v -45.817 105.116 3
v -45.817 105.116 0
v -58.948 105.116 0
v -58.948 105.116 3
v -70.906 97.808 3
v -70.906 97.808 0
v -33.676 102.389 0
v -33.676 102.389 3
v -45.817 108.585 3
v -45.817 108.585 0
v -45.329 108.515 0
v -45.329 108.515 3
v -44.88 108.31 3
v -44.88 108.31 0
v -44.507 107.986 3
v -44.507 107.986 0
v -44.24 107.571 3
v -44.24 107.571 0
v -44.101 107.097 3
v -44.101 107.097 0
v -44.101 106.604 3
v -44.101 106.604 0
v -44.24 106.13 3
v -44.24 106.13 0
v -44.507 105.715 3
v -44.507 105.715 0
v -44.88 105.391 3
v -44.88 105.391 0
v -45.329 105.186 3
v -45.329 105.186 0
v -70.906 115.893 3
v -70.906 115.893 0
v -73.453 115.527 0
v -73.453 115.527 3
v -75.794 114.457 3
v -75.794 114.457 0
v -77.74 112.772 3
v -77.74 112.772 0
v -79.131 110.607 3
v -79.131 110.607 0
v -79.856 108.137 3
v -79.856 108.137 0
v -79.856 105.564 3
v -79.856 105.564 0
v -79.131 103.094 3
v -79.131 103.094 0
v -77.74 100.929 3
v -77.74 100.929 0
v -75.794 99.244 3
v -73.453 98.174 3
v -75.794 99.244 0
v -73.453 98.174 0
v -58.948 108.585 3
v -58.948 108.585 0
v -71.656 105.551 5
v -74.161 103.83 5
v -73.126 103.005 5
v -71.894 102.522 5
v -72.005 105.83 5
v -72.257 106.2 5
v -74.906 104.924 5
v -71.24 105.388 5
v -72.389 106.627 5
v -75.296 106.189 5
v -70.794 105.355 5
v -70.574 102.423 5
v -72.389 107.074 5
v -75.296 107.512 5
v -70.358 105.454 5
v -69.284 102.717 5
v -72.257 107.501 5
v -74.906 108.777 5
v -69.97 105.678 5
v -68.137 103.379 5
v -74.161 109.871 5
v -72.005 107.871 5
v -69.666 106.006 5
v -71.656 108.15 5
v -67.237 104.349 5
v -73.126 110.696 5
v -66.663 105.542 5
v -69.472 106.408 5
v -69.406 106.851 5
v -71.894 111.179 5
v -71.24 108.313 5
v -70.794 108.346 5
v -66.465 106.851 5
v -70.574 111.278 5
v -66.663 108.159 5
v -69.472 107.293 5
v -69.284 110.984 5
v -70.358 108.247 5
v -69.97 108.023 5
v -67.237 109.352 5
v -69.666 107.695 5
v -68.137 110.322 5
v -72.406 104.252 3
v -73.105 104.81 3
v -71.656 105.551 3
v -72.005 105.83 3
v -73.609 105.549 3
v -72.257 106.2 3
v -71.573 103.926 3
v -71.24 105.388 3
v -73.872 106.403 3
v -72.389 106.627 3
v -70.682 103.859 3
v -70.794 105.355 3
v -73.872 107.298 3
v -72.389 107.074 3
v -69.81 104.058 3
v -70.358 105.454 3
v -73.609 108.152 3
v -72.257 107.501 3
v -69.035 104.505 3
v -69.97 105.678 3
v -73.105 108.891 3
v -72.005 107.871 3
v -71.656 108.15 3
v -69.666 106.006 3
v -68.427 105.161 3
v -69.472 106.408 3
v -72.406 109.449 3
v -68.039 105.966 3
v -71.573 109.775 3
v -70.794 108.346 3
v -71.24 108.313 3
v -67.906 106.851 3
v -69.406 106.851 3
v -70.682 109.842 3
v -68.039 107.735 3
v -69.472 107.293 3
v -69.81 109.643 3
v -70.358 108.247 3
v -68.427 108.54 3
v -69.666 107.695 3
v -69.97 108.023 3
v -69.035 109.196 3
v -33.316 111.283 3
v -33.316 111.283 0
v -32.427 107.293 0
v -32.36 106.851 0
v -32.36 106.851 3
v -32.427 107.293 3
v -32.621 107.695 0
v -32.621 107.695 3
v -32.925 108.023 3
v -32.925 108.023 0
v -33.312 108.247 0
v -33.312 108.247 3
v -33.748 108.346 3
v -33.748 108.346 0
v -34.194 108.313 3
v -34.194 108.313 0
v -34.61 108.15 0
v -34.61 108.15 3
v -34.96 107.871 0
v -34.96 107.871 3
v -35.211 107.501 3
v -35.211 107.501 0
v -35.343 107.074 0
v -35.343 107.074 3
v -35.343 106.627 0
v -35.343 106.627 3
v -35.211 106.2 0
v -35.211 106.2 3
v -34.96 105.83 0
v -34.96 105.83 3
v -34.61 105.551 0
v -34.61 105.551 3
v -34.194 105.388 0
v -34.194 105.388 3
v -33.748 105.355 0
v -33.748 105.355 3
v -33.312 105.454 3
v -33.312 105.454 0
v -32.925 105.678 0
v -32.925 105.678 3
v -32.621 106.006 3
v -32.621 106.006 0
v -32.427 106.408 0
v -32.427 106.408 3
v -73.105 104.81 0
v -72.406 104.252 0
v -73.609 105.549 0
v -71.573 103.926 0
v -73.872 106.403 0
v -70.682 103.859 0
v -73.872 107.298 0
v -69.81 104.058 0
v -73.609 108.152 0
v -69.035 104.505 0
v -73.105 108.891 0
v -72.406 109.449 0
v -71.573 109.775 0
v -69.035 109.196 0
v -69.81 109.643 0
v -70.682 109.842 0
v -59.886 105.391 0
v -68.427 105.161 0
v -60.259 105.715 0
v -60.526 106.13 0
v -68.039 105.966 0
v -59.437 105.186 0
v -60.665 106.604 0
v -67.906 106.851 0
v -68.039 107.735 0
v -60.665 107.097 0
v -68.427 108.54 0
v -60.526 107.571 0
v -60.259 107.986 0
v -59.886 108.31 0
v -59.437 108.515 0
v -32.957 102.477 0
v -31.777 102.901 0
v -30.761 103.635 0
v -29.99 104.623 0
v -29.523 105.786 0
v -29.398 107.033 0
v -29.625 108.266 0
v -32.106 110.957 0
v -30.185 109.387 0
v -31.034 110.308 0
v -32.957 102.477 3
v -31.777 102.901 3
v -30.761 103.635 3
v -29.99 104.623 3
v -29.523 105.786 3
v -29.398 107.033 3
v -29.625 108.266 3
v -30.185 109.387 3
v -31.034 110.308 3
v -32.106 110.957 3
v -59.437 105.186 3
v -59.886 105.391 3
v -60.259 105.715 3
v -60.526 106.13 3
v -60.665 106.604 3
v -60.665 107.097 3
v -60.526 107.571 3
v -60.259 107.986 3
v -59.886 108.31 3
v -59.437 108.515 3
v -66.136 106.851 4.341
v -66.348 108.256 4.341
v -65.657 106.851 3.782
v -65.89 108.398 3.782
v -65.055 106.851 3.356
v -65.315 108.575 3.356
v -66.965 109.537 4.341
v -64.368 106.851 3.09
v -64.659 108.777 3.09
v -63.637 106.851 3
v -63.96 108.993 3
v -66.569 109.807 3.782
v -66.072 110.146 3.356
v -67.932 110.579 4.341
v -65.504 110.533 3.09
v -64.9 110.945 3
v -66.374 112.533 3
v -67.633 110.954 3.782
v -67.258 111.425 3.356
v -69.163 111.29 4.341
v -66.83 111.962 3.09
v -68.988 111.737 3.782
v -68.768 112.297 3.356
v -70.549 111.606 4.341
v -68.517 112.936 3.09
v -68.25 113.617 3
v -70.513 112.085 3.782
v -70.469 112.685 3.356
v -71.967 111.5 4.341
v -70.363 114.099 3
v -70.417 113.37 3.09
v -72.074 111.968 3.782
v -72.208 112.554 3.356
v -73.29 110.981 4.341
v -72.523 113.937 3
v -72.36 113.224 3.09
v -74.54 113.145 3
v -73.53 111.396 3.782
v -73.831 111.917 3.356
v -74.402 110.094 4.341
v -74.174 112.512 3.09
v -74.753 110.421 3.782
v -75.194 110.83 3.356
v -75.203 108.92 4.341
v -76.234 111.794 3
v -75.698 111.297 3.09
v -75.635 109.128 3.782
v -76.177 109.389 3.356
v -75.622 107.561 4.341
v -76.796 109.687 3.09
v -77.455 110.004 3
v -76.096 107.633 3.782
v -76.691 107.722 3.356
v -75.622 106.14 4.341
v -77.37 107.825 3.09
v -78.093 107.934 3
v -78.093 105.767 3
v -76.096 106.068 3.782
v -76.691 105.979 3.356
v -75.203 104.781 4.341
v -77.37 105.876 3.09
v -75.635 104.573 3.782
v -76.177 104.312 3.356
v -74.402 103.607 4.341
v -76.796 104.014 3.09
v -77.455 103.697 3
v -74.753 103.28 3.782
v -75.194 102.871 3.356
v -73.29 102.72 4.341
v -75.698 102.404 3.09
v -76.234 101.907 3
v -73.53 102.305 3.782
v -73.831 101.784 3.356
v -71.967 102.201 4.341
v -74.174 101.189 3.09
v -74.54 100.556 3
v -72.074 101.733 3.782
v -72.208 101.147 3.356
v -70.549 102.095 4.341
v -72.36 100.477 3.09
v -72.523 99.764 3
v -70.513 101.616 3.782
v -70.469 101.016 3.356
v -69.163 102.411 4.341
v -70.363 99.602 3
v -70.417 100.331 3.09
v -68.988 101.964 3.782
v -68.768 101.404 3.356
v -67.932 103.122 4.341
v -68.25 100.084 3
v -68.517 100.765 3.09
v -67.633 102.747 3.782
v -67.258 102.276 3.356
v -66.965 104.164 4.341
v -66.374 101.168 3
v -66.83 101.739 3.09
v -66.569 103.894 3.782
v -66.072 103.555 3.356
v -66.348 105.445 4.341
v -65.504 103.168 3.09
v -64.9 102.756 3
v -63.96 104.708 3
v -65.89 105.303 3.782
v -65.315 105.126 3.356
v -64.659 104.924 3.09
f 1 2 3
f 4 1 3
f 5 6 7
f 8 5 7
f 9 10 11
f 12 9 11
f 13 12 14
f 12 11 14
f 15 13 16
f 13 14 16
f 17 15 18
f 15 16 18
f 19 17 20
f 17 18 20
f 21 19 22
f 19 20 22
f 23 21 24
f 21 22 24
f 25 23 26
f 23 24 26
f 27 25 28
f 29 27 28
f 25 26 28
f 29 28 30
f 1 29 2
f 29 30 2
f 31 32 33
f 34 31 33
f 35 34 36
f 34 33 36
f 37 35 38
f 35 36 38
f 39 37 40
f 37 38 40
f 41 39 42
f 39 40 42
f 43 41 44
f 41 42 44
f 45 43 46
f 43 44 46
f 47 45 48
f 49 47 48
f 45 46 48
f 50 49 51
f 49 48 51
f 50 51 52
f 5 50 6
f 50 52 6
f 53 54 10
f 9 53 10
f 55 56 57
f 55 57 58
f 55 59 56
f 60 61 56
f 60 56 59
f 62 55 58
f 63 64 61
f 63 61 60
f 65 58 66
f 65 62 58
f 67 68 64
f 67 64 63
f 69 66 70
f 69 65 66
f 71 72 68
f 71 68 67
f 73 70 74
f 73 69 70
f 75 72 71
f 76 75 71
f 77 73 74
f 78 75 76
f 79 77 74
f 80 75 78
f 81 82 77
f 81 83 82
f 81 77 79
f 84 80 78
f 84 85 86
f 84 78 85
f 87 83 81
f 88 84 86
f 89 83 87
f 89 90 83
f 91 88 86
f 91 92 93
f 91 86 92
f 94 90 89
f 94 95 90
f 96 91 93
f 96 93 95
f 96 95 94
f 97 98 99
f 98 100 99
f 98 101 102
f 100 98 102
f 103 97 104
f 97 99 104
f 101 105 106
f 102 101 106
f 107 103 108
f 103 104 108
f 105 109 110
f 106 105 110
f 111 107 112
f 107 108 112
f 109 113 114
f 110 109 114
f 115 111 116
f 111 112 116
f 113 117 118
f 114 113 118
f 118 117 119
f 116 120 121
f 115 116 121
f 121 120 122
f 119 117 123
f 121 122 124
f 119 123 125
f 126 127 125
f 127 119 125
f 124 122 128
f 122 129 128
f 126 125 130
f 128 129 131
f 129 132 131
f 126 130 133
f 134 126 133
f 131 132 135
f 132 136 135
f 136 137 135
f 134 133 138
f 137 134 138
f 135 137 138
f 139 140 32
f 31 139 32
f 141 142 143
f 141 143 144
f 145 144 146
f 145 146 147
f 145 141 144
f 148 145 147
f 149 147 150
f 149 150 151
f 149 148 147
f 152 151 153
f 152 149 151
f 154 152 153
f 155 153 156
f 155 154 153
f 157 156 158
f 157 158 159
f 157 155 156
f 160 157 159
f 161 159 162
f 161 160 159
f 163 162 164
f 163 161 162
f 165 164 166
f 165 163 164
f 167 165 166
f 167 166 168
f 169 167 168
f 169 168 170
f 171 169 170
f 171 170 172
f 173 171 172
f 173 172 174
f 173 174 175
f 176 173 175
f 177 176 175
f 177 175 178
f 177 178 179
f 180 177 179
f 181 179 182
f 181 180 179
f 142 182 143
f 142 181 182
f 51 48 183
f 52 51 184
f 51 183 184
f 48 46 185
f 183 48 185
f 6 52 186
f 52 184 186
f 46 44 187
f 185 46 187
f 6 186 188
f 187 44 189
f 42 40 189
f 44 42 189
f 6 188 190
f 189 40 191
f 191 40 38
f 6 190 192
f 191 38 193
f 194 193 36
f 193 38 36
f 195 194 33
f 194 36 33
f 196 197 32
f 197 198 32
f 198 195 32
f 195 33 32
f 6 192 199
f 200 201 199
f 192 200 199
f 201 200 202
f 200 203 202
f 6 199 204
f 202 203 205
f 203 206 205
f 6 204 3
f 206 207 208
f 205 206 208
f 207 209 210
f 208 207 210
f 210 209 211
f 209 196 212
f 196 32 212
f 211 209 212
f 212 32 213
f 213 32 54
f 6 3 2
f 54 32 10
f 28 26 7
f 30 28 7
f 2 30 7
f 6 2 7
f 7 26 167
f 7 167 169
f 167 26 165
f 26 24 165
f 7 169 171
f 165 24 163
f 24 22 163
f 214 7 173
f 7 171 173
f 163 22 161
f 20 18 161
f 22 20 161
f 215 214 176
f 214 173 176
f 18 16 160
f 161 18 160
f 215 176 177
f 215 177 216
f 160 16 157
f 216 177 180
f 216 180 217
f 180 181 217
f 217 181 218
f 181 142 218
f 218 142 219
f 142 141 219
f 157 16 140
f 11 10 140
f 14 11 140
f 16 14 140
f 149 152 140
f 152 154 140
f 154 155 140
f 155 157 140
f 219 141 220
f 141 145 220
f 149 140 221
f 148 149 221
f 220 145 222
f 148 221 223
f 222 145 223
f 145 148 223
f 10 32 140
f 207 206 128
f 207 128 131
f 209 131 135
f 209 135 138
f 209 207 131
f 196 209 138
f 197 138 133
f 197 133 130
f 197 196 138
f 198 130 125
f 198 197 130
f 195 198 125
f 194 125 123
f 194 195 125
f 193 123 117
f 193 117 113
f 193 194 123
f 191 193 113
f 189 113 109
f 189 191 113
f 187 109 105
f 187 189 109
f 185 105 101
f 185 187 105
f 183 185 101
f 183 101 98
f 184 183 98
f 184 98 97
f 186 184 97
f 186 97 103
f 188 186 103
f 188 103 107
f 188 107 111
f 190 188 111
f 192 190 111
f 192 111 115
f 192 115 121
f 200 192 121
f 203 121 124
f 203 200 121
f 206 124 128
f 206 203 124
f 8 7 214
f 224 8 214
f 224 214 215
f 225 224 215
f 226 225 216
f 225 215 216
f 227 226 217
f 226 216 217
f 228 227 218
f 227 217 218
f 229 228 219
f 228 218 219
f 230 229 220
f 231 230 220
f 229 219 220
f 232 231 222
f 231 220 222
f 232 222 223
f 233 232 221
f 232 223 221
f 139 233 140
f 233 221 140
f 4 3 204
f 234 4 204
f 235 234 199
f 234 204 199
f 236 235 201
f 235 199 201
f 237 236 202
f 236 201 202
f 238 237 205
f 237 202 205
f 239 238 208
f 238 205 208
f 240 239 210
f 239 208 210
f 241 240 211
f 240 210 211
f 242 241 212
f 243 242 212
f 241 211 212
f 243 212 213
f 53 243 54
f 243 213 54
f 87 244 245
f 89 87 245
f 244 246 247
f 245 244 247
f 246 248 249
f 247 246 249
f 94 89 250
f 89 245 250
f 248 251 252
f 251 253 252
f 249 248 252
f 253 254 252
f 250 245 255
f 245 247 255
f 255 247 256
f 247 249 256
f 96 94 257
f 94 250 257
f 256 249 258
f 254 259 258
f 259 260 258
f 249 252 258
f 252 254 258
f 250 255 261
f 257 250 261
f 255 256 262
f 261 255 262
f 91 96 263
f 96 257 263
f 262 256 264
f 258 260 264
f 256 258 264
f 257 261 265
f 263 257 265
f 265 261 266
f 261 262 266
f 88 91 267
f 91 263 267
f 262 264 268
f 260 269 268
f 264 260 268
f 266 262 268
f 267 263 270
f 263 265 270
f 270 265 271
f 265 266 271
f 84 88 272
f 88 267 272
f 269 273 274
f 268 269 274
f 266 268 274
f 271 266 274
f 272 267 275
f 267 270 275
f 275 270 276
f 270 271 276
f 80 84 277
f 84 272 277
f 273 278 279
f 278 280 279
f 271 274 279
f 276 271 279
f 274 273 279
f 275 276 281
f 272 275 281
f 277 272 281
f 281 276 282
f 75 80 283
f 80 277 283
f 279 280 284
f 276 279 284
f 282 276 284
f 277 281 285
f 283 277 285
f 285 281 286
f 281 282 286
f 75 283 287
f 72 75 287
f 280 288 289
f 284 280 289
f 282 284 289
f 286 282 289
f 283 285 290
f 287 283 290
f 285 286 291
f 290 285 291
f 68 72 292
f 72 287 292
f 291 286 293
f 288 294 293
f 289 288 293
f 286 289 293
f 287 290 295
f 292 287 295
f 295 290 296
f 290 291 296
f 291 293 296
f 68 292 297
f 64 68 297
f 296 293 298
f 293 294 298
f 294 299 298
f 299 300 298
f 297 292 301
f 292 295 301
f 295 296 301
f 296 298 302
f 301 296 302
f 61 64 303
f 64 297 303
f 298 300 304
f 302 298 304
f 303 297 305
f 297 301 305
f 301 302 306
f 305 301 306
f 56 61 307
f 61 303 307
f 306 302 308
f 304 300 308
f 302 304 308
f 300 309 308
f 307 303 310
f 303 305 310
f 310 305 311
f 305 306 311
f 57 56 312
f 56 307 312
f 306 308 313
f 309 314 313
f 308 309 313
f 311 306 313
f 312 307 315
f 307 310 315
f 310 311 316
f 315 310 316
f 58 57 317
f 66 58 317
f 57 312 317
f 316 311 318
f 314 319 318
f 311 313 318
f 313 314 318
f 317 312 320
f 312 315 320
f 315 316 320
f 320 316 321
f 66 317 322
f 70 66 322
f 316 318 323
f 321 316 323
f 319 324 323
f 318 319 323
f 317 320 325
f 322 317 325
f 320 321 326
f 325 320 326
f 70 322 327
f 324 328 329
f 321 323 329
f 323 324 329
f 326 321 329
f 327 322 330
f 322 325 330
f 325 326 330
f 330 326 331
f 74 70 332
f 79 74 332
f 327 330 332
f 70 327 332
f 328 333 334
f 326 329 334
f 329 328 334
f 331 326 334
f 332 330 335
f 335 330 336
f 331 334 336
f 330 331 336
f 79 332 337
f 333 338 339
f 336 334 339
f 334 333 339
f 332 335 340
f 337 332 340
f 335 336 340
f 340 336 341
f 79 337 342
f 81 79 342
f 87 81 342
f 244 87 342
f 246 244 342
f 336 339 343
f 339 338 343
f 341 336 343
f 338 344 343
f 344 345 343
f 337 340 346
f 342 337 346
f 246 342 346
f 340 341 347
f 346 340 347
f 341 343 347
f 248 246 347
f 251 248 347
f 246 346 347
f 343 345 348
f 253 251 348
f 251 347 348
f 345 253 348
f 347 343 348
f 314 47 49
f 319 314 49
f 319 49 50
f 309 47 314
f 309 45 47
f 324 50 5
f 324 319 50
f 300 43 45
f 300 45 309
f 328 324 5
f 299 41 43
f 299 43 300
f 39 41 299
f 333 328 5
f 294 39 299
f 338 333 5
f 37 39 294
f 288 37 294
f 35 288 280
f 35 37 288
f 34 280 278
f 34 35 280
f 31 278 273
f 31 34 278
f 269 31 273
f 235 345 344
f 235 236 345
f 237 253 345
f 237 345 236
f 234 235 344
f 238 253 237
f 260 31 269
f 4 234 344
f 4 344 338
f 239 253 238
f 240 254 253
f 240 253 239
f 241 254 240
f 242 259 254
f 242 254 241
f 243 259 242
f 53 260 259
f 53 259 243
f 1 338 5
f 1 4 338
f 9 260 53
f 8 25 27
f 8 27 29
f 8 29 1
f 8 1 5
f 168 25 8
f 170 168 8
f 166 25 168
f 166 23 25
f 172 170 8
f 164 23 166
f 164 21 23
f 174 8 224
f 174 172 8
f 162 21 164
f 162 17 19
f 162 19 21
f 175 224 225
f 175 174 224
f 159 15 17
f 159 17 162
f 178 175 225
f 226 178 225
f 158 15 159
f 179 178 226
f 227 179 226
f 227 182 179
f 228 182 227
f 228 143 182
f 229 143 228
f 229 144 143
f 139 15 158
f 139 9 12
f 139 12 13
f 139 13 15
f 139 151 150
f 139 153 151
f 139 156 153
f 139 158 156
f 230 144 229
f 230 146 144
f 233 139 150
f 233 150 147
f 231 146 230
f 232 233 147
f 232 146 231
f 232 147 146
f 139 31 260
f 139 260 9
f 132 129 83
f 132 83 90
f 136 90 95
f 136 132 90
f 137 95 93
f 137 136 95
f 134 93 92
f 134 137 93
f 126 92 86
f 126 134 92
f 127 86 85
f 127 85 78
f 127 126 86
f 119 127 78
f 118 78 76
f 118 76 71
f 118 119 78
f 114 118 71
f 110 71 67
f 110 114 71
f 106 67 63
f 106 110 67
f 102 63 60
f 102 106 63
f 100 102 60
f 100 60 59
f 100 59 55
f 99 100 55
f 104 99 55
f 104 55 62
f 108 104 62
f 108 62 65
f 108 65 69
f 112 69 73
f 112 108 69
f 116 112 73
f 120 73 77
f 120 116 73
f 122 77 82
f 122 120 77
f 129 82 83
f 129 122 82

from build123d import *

# Parameters (mm, degrees)
SKETCH1_R           = 3
SKETCH1_R_2         = 1.5
BOSS_EXTRUDE1_DEPTH = 3
SKETCH2_R           = 4.440231585
SKETCH2_R_2         = 1.5
BOSS_EXTRUDE2_DEPTH = 2
FILLET1_R           = 3


with BuildPart() as part:
    # Sketch1 → Boss-Extrude1 (new body)
    with BuildSketch(Plane.XY):
        with BuildLine():
            Line((-33.316424849, 111.282839546), (-70.905727769, 115.89291218))
            ThreePointArc((-70.905727769, 115.89291218), (-79.948137164, 106.850502785), (-70.905727769, 97.808093391))
            Line((-70.905727769, 97.808093391), (-33.676430248, 102.388731808))
            Line((-33.676430248, 102.388731808), (-32.956569458, 102.477302429))
            ThreePointArc((-32.956569458, 102.477302429), (-29.398198623, 107.032843823), (-33.316424849, 111.282839546))
        make_face()
        with Locations((-70.905727769, 106.850502785)):
            Circle(SKETCH1_R, mode=Mode.SUBTRACT)
        with BuildLine():
            ThreePointArc((-45.817442834, 108.585056612), (-44.082889007, 106.850502785), (-45.817442834, 105.115948958))
            Line((-45.817442834, 105.115948958), (-58.948305776, 105.115948958))
            ThreePointArc((-58.948305776, 105.115948958), (-60.682859603, 106.850502785), (-58.948305776, 108.585056612))
            Line((-58.948305776, 108.585056613), (-45.817442834, 108.585056613))
        make_face(mode=Mode.SUBTRACT)
        with Locations((-33.860020841, 106.850502785)):
            Circle(SKETCH1_R_2, mode=Mode.SUBTRACT)
    extrude(amount=BOSS_EXTRUDE1_DEPTH)

    # Sketch2 → Boss-Extrude2 (add)
    with BuildSketch(Plane.XY.offset(3)):
        with Locations((-70.905727769, 106.850502785)):
            Circle(SKETCH2_R)
        with Locations((-70.905727769, 106.850502785)):
            Circle(SKETCH2_R_2, mode=Mode.SUBTRACT)
    extrude(amount=BOSS_EXTRUDE2_DEPTH)

    # Fillet1
    # the kernel refuses this fillet: 3 mm, written as the material it adds along each edge
    with BuildSketch(Plane(origin=(-70.905727769, 106.850502785, 3), x_dir=(1, 0, 0), z_dir=(0, -1, 0))) as fillet1_piece_1:
        with BuildLine():
            CenterArc((7.26865871, 3), FILLET1_R, 199.471220634, 70.528779366)
            Line((4.440231585, 2), (4.383663043, 1.98))
            ThreePointArc((4.383663043, 1.98), (4.380231585, 1), (4.380231585, 0))
            Line((4.380231585, 0), (4.440231585, -0.06))
            Line((4.440231585, -0.06), (7.26865871, -0.06))
            Line((7.26865871, -0.06), (7.26865871, 0))
        make_face()
    revolve(axis=Axis((-70.905727769, 106.850502785, 3), (0, 0, 1)))


solid = part.part
